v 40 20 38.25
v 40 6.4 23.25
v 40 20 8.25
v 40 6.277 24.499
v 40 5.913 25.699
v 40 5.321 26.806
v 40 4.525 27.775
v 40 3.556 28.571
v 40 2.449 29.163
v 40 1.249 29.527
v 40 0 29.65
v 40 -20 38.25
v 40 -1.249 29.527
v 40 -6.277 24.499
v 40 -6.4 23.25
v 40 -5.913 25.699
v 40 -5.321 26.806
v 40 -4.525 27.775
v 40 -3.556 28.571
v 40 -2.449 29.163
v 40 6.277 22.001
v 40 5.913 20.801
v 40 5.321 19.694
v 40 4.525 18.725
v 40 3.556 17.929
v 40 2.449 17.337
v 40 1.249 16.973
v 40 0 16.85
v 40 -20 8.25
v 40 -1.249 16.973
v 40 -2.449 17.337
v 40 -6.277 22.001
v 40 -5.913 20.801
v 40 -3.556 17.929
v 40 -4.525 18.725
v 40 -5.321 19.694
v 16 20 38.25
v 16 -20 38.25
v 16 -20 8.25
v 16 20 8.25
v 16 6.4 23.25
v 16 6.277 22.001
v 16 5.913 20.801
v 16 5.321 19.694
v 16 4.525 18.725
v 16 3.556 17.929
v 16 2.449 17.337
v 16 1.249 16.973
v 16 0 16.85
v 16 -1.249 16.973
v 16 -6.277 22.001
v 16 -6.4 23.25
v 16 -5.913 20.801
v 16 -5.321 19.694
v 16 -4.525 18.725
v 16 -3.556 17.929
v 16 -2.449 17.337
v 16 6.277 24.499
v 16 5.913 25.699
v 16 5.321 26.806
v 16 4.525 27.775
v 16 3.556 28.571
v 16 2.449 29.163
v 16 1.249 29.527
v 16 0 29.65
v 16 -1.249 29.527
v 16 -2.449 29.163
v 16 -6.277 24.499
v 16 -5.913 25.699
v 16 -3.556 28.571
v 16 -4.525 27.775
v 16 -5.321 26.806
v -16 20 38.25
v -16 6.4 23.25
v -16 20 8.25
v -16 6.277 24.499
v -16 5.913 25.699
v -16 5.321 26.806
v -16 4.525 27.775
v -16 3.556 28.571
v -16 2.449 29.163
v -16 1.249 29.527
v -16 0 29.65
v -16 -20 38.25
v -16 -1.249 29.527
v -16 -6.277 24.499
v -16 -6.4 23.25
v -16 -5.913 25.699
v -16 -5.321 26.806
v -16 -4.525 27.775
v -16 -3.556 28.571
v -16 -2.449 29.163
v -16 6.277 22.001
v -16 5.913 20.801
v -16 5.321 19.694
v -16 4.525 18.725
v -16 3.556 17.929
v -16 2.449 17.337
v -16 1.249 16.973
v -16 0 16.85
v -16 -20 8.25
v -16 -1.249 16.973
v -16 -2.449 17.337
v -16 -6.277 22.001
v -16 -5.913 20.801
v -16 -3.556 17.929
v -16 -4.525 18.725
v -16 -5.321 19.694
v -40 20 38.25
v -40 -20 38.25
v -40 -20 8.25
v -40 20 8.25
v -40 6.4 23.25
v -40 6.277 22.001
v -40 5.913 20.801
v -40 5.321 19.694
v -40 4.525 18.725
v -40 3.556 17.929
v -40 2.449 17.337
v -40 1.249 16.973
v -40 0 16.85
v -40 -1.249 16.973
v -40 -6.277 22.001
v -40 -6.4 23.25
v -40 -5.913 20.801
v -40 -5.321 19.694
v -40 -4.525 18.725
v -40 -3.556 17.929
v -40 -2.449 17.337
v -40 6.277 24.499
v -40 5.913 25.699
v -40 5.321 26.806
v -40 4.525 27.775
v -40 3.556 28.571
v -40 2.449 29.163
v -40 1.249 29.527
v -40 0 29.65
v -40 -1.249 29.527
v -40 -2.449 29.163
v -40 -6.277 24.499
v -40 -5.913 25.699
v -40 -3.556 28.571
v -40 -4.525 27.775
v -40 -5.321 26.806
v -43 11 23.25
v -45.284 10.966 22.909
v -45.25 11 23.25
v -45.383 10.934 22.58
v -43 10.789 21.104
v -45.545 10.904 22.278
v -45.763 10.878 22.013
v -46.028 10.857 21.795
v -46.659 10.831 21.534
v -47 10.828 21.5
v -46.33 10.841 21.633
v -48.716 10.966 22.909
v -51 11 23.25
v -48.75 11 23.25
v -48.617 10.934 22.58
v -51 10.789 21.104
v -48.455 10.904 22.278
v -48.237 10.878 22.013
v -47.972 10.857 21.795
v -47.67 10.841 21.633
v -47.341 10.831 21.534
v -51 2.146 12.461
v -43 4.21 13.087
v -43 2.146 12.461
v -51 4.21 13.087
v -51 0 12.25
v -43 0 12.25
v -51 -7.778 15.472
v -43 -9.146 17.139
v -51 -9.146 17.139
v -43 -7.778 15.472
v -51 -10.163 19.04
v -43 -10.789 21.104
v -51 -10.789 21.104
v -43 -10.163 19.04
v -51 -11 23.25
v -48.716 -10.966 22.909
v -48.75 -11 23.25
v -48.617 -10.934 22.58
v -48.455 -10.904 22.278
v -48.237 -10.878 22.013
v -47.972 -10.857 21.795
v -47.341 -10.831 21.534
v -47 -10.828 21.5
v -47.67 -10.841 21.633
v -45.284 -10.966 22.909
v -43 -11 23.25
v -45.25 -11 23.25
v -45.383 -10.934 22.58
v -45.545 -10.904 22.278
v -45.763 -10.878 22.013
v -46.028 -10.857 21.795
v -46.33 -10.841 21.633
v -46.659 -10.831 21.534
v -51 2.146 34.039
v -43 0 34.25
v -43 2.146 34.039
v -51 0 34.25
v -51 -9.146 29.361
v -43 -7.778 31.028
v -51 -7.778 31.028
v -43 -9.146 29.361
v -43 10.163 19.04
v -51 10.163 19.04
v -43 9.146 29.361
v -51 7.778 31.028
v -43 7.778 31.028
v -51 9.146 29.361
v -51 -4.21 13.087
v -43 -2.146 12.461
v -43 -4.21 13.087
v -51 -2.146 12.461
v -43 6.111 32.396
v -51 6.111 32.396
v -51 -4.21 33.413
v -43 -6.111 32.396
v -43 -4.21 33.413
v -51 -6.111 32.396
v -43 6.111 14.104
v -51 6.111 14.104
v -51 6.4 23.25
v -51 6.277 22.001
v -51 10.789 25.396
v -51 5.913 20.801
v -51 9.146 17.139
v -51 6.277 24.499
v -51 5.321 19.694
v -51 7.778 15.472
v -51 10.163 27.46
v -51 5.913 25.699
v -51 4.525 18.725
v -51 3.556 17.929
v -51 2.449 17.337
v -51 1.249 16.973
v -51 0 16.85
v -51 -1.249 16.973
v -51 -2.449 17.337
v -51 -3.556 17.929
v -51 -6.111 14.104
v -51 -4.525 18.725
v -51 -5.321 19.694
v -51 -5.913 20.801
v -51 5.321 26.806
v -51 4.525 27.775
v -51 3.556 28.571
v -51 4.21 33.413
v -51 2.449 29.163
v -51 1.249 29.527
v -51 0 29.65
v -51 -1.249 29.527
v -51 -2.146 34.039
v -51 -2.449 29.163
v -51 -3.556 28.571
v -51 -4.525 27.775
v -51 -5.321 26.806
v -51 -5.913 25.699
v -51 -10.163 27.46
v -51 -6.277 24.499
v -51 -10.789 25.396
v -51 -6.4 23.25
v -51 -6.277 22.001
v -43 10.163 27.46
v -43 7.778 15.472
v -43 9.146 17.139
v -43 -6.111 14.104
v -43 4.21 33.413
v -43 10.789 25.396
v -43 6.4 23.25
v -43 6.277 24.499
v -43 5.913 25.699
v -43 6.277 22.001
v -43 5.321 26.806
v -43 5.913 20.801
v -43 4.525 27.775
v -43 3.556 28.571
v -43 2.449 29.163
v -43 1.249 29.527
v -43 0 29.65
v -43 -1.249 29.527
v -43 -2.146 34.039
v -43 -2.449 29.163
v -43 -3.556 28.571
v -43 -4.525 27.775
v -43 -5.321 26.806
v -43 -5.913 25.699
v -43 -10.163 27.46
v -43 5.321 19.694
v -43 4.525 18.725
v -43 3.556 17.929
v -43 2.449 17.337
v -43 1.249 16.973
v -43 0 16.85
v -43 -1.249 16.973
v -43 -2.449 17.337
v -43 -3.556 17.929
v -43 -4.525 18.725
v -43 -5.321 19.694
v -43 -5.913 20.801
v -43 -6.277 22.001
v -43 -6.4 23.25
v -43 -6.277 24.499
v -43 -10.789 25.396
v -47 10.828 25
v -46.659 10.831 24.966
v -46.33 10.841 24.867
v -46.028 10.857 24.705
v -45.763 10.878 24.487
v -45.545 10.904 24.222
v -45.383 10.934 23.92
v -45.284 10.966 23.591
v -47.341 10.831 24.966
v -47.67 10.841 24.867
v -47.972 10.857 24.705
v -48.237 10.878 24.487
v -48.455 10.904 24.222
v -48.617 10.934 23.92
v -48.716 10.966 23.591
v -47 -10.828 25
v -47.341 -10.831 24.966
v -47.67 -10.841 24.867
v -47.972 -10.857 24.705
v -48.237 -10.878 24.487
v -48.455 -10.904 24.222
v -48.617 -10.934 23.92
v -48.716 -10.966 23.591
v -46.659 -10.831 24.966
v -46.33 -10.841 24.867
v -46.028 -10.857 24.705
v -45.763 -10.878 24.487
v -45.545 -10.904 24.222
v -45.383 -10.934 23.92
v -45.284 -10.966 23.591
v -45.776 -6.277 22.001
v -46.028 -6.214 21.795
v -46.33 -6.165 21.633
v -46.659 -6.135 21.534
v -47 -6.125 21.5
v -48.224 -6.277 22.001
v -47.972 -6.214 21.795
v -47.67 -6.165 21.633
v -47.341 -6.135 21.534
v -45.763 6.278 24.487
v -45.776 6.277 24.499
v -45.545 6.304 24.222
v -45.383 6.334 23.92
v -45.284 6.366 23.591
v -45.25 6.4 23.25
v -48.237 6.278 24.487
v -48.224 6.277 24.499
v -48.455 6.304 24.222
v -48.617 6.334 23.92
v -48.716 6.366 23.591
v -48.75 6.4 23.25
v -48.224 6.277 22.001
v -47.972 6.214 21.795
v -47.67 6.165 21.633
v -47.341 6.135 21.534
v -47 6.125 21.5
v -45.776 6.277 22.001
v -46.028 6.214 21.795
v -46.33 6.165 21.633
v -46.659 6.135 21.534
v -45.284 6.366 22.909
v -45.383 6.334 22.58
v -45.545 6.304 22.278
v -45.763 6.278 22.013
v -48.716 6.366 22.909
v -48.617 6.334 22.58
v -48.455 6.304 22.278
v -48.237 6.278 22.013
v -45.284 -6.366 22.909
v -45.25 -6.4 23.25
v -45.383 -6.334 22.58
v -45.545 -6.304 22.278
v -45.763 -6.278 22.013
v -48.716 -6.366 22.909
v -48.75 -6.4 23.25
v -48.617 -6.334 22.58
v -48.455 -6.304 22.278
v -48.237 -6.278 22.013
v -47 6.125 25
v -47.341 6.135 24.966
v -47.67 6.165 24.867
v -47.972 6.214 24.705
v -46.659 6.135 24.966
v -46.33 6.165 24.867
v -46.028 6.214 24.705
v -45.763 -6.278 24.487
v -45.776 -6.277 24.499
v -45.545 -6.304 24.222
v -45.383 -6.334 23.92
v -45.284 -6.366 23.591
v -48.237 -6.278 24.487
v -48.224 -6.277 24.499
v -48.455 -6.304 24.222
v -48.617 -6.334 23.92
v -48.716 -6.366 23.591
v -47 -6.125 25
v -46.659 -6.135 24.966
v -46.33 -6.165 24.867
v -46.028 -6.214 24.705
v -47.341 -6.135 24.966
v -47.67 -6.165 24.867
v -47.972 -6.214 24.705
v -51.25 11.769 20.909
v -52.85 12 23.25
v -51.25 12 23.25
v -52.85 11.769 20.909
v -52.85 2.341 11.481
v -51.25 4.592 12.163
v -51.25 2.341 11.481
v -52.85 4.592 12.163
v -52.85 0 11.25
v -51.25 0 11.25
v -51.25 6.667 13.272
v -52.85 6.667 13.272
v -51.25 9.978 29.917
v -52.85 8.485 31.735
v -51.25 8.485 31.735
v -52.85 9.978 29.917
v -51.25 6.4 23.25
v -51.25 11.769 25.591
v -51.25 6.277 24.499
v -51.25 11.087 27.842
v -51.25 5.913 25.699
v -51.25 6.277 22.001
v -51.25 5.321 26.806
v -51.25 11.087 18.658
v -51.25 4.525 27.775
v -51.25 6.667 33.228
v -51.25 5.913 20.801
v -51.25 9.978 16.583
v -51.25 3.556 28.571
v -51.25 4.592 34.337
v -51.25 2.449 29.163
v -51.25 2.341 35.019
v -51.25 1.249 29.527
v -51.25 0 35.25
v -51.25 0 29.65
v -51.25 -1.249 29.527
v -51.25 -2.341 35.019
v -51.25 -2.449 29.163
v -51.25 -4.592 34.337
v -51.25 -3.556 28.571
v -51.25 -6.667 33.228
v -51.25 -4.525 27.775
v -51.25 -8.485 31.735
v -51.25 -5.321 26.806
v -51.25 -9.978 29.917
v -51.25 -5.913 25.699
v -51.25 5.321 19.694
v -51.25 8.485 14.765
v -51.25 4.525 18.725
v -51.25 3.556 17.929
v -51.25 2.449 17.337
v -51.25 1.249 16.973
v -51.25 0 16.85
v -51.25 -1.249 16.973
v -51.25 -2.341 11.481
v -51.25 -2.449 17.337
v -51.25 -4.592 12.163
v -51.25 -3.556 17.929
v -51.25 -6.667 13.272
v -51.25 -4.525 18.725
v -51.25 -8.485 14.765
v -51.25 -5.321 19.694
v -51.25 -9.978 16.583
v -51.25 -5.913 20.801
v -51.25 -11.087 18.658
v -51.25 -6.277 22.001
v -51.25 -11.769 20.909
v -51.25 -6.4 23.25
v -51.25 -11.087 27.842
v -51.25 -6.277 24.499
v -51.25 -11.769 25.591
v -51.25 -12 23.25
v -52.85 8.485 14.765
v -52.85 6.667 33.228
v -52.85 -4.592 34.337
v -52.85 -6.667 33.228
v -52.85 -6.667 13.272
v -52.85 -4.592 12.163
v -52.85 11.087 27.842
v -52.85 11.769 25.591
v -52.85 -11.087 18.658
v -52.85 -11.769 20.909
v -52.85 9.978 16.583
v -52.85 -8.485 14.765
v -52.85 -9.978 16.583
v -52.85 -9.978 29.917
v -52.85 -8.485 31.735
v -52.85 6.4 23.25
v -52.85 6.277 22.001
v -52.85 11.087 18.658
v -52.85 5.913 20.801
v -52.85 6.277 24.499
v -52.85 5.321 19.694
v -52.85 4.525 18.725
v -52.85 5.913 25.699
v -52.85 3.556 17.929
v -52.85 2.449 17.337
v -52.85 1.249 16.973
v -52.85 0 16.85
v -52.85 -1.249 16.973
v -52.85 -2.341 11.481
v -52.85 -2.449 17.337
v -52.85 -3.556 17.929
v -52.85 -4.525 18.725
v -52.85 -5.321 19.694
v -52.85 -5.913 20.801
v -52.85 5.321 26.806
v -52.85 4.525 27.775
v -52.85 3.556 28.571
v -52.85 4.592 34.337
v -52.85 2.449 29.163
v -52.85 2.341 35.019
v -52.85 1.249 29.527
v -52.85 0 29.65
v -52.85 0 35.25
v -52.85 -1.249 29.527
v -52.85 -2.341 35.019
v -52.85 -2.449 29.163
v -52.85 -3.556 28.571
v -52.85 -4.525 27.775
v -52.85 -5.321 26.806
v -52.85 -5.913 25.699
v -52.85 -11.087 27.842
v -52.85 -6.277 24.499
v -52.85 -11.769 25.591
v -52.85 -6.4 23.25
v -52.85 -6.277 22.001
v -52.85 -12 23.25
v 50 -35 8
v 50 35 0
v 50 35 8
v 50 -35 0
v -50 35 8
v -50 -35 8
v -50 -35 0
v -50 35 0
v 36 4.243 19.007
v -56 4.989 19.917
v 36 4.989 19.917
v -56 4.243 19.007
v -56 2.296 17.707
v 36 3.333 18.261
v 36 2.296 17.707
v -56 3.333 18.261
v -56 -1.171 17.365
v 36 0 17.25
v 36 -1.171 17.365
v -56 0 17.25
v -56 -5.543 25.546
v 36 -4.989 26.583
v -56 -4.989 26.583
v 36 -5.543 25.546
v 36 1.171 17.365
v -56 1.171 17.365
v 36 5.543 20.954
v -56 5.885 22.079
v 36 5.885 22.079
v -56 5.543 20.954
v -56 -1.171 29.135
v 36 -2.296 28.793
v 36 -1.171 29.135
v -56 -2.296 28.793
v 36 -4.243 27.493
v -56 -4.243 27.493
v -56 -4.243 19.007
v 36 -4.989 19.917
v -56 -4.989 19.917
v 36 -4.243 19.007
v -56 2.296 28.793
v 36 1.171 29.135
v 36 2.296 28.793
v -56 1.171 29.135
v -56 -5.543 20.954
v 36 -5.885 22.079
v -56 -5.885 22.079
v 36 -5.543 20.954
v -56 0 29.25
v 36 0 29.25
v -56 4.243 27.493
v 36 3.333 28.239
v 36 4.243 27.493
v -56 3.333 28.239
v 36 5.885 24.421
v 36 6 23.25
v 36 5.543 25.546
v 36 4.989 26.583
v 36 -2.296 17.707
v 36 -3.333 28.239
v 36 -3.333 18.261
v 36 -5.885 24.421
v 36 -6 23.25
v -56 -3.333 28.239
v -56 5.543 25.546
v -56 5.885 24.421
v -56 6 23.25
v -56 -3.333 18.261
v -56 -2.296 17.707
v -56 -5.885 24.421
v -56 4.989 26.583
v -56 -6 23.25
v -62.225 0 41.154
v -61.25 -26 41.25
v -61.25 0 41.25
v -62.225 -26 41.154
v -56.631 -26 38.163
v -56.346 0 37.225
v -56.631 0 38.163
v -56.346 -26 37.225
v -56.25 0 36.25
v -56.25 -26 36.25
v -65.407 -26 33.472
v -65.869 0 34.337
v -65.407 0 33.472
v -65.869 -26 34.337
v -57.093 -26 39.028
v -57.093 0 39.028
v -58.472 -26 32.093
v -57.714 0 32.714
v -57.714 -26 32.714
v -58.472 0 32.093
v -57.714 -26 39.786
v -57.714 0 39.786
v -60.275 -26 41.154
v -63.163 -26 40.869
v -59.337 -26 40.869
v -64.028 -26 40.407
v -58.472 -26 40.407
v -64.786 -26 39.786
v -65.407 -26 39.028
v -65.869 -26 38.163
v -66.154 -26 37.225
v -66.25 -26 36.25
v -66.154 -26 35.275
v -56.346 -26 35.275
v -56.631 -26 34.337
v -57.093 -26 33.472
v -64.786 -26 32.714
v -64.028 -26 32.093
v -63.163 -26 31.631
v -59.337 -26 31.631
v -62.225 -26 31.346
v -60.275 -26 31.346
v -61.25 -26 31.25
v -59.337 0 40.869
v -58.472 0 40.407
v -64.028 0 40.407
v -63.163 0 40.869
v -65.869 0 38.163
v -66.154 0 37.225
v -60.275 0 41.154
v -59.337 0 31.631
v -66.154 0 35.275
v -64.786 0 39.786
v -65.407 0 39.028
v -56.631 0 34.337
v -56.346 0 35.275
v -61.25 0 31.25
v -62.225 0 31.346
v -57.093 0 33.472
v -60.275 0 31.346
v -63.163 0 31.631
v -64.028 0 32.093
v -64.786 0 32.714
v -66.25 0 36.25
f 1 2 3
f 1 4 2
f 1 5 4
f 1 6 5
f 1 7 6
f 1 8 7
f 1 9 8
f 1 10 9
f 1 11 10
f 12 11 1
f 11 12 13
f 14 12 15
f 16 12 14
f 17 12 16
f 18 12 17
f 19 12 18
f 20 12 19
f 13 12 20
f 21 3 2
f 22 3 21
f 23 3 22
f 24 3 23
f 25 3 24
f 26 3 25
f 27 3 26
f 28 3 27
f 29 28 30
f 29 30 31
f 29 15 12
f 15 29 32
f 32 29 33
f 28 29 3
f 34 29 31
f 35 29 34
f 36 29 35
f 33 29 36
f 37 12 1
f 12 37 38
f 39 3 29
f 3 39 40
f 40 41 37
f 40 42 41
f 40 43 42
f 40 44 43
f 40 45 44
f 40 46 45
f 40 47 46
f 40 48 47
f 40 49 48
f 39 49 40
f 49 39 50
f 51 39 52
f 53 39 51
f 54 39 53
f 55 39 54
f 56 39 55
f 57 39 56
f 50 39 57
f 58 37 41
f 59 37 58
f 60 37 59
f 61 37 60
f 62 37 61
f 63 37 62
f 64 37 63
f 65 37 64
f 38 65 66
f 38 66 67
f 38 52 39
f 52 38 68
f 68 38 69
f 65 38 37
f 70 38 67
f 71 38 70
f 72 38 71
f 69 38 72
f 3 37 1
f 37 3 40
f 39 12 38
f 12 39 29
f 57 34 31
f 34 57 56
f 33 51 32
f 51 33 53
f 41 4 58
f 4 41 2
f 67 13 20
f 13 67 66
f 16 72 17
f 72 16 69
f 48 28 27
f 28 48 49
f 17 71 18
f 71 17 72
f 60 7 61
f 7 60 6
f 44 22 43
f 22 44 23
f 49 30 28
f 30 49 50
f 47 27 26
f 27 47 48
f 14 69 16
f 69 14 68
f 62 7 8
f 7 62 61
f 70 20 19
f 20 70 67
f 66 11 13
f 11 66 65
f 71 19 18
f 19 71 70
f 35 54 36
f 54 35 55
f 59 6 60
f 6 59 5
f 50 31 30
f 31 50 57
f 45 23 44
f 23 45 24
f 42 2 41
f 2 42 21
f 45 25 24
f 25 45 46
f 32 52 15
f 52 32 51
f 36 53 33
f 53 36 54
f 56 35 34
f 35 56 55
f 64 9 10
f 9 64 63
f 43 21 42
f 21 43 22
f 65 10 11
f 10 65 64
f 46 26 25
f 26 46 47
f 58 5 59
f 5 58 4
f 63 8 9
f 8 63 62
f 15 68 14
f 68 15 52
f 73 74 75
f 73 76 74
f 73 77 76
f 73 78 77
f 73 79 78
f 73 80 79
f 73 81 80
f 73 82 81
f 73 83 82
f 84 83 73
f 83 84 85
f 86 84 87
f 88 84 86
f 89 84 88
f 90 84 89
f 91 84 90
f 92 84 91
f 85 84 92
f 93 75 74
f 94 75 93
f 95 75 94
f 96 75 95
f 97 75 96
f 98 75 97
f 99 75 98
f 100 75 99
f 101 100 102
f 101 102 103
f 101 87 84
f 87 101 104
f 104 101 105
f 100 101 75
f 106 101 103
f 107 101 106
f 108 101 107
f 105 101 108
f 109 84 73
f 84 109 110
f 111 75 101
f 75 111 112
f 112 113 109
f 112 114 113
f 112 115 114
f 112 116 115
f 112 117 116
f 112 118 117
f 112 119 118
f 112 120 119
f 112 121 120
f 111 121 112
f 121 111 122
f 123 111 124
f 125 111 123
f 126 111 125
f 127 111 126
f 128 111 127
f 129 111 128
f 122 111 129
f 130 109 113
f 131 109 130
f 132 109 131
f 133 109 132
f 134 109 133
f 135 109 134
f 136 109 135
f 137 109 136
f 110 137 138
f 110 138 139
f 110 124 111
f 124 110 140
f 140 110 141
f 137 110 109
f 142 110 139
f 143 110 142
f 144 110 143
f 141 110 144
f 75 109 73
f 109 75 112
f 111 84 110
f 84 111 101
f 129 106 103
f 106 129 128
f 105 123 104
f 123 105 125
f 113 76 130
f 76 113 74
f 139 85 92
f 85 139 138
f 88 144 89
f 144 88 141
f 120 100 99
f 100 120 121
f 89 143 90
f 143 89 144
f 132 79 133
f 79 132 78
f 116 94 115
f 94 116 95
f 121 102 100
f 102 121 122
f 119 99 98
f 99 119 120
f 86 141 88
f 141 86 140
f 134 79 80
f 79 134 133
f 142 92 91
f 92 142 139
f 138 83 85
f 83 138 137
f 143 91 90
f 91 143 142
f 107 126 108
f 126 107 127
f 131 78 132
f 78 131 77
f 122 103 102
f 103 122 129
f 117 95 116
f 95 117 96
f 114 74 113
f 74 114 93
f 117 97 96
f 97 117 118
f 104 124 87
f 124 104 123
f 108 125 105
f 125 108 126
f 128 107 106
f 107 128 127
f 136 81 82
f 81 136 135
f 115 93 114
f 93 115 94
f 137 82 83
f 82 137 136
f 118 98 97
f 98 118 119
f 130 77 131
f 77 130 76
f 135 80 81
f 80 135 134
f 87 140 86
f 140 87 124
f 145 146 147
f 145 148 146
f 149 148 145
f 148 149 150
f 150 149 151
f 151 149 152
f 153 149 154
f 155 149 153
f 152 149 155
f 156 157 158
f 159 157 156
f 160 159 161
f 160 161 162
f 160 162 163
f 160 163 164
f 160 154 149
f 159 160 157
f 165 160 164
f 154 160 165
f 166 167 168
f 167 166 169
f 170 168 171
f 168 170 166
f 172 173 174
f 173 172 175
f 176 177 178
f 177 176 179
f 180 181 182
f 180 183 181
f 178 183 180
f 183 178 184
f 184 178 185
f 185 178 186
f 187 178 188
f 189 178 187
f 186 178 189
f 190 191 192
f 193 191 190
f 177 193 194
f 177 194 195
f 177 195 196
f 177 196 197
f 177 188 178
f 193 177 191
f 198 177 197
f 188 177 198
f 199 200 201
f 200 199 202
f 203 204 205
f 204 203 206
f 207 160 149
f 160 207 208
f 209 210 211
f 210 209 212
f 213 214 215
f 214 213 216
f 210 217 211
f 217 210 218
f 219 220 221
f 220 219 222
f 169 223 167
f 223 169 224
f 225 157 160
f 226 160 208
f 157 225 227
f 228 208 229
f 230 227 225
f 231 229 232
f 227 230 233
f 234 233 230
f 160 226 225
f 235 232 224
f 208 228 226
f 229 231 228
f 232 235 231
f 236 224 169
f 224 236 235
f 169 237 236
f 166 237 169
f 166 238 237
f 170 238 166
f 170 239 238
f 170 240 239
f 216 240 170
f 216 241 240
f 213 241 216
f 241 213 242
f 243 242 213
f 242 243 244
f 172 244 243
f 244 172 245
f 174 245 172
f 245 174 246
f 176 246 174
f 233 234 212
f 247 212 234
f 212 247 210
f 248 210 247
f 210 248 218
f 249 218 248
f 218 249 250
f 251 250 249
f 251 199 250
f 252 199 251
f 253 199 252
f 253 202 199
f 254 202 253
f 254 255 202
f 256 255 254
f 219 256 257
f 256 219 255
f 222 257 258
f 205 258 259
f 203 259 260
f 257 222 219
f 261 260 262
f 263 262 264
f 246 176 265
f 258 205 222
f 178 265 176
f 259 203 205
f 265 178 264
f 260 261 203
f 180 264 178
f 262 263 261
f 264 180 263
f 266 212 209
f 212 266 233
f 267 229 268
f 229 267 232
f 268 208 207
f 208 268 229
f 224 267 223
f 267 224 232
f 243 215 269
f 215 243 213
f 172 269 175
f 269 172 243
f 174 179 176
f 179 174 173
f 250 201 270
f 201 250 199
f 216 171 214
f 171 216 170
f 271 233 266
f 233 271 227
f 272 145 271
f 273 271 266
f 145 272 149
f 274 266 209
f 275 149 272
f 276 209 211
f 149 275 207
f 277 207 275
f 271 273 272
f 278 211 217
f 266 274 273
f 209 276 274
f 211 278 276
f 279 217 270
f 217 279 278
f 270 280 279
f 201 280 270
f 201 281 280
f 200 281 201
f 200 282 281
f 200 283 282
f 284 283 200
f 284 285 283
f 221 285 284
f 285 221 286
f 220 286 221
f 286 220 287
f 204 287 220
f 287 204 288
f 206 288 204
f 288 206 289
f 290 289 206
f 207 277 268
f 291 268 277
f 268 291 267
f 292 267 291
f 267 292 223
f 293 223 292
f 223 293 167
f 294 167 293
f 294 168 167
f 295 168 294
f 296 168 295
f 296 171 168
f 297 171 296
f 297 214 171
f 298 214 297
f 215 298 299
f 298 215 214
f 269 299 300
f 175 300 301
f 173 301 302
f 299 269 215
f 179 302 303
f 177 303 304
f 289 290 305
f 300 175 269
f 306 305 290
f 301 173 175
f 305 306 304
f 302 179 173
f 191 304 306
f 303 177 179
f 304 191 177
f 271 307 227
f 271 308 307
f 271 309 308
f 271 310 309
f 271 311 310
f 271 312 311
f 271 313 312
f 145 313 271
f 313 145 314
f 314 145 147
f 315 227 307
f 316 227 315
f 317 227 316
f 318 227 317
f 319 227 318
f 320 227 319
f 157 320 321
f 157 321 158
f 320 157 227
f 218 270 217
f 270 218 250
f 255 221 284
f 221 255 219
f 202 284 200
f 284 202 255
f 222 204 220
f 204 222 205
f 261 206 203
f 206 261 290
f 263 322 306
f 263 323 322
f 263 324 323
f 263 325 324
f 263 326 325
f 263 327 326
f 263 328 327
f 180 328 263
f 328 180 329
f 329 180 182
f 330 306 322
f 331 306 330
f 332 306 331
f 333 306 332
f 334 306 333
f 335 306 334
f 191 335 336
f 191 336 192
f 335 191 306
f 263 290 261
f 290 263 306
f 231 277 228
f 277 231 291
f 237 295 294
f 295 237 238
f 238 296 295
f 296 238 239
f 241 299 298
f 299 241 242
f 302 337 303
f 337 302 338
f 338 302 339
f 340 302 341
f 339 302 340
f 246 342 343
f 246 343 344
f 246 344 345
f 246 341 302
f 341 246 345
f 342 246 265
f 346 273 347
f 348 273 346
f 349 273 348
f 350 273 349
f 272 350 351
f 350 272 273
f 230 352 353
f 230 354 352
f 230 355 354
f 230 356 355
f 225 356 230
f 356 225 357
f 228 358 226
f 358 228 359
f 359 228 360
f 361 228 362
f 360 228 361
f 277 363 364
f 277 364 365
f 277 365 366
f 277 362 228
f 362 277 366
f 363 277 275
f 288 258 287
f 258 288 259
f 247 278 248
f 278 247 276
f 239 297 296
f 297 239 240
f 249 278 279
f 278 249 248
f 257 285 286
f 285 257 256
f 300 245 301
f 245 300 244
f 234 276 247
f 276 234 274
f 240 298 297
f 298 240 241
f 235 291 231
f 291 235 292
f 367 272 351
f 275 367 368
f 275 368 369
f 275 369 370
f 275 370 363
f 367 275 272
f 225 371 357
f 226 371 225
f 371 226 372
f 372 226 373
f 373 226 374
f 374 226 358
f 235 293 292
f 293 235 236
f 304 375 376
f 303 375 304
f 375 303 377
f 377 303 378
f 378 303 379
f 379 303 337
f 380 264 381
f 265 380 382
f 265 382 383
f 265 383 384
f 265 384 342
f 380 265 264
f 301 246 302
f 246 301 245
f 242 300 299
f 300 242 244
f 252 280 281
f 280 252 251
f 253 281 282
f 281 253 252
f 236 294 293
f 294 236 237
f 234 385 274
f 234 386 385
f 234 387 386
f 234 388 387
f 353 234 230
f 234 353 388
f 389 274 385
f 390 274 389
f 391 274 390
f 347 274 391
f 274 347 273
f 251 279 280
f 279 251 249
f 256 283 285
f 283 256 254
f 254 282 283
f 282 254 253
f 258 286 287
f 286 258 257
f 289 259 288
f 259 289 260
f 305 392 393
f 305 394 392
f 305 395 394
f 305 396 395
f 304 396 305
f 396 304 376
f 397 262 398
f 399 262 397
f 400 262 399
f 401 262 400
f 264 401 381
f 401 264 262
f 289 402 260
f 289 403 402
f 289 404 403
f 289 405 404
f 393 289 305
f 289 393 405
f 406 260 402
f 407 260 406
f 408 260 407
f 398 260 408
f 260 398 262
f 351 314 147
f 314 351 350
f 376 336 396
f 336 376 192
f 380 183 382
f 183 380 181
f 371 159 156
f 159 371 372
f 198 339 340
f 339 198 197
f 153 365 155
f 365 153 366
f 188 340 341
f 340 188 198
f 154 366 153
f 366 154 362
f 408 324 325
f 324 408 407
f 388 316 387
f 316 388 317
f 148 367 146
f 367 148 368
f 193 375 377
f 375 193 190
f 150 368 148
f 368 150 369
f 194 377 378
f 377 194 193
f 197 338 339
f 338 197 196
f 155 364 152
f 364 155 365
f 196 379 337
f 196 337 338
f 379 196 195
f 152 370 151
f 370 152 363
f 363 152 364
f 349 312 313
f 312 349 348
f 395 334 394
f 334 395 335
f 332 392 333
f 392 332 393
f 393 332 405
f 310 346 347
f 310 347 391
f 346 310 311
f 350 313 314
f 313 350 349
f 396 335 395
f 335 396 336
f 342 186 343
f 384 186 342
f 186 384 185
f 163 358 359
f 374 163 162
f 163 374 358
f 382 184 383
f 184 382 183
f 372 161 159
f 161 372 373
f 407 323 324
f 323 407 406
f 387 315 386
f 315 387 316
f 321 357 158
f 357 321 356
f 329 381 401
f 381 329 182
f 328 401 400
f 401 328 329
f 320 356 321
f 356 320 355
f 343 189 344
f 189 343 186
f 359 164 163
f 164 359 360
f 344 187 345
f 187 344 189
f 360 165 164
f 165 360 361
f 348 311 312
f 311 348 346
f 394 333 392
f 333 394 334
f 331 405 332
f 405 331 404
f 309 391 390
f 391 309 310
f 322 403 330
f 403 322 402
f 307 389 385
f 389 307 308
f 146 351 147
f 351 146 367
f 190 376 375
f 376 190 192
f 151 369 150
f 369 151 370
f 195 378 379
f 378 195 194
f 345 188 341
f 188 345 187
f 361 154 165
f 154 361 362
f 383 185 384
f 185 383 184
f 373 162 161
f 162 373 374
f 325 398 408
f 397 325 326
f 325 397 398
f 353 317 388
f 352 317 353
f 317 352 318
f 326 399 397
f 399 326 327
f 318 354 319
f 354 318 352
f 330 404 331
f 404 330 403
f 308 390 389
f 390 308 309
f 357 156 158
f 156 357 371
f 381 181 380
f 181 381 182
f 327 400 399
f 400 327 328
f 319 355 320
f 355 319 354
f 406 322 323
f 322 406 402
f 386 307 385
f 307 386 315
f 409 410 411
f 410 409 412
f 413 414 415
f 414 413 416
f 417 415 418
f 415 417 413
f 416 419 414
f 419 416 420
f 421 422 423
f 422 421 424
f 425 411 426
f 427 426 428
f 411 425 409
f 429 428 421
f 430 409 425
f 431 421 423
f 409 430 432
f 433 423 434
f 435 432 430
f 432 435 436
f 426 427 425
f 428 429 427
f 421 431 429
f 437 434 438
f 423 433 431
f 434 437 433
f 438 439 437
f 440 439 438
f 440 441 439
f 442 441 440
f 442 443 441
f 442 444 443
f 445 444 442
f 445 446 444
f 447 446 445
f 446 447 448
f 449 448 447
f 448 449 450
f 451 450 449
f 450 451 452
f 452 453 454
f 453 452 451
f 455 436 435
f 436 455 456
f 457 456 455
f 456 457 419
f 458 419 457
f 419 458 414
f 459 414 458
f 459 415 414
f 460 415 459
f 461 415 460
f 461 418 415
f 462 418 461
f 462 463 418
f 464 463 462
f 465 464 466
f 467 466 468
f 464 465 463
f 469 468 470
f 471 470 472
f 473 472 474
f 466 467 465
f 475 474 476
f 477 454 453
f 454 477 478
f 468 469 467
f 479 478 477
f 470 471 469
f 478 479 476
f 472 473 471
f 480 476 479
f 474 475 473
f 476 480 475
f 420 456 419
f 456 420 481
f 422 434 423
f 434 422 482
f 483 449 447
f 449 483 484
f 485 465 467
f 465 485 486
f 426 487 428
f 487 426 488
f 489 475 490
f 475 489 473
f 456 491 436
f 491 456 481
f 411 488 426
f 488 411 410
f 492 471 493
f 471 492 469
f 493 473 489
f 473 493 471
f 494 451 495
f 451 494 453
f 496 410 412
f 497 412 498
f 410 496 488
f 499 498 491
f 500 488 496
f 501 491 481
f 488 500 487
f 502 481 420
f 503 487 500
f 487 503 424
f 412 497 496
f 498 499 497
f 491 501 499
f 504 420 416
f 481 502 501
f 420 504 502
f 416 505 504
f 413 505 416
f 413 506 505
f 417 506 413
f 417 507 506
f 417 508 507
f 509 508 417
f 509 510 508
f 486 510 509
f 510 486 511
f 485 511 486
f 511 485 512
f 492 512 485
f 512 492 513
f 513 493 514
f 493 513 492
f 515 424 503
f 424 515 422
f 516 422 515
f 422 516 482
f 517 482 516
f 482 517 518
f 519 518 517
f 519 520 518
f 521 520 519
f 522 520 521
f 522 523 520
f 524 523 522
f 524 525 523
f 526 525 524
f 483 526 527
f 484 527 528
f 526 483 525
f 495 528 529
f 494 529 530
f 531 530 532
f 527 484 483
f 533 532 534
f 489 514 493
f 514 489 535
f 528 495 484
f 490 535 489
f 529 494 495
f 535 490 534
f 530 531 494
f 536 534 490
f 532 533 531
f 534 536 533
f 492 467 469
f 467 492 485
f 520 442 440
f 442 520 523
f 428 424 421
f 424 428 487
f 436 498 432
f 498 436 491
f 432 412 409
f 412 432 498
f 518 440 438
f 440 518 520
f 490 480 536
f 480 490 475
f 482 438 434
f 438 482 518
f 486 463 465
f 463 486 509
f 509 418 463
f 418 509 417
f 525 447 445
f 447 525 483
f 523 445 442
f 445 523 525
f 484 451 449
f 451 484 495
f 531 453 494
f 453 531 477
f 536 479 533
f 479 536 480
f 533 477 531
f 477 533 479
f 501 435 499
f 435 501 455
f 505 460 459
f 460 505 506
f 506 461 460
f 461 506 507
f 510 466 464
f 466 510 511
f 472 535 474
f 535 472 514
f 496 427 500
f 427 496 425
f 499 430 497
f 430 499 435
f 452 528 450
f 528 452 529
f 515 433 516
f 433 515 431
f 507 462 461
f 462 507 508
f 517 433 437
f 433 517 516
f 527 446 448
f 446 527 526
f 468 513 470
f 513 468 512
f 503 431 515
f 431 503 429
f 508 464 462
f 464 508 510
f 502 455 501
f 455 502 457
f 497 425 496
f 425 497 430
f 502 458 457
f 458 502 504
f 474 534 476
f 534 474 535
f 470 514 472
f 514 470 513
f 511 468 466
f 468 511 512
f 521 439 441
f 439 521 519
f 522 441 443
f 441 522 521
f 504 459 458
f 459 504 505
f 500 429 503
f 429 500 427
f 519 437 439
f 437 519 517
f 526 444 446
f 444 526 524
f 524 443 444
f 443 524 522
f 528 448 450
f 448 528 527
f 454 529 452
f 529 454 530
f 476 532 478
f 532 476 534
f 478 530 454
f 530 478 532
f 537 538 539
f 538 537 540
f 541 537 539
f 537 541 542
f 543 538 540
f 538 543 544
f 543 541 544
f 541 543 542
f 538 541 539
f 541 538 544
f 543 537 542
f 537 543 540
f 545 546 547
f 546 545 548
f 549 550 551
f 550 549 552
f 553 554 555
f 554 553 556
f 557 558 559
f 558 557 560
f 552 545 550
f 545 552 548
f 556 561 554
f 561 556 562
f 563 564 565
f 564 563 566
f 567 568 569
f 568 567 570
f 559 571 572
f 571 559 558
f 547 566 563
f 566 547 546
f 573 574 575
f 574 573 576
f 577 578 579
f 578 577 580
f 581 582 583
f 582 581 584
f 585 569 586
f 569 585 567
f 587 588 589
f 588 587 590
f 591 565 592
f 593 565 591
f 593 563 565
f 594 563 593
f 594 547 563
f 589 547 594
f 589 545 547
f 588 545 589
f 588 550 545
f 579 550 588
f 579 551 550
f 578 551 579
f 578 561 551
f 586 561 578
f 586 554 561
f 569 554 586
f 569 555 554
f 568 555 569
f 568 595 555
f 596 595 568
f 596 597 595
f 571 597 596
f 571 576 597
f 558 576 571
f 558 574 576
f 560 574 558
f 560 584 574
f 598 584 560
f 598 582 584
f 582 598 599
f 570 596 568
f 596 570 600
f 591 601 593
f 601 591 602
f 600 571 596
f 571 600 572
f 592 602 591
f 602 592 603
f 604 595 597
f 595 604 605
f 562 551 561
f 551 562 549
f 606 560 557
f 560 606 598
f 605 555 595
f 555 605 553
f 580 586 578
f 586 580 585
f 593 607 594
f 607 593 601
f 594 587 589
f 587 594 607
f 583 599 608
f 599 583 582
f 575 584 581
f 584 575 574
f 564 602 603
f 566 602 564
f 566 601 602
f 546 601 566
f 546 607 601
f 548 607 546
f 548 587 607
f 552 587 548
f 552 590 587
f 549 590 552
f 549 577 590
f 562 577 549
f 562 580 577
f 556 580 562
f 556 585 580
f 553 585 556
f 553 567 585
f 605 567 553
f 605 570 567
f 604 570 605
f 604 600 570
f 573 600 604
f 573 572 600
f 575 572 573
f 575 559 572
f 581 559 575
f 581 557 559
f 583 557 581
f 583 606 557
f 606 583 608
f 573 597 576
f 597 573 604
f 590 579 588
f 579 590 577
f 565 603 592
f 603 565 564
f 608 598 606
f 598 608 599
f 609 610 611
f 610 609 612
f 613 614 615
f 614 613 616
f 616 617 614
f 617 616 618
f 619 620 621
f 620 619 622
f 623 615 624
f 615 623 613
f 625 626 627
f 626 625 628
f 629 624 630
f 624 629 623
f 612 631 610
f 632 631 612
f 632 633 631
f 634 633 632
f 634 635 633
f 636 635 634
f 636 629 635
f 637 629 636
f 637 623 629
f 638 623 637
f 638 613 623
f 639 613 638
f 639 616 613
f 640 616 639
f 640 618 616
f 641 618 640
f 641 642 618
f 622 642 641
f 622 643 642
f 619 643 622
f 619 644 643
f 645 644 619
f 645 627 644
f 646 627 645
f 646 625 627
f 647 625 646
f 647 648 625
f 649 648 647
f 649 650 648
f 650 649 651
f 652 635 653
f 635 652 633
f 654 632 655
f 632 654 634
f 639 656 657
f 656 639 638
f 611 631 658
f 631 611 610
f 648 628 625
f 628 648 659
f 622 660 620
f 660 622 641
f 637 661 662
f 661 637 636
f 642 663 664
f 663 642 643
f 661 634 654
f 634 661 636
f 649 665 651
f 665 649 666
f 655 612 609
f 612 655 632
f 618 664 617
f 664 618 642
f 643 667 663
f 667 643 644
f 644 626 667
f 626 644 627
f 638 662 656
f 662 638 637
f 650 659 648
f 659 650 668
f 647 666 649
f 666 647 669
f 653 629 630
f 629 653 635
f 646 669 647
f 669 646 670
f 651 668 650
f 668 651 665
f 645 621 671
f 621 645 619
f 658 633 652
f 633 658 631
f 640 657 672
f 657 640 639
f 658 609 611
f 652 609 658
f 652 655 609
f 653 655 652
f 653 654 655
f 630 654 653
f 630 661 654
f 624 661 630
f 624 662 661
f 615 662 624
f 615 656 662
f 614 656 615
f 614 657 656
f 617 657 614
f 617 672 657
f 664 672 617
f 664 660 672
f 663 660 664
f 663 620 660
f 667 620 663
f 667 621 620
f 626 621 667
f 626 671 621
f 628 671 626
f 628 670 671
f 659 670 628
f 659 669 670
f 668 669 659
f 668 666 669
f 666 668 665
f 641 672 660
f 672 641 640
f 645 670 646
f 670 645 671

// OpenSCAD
$fn = 32;

// ------------------------------------------------------------------------
// Machine vise: screw d12, jaws 24 x 30 mm
// Every part is its own module, assembly() places every instance.
// ------------------------------------------------------------------------

// --- part 1 ---
module vise_bed() {
  difference() {
    translate([-50, -35, 0]) cube([100, 70, 8]);
  }
}

// --- part 2 ---
module vise_jaw() {
  difference() {
    translate([-12, -20, 0]) cube([24, 40, 30]);
    translate([0, 0, 15]) rotate([0, 90, 0]) cylinder(h = 26, d = 12.8, center = true);
  }
}

// --- part 3 ---
module vise_screw() {
  translate([0, 0, -46]) cylinder(h = 92, d = 12);
}

// --- part 4 ---
module screw_collar() {
  difference() {
    cylinder(h = 8, d = 22);
    translate([0, 0, -1]) cylinder(h = 10, d = 12.8);
    translate([0, 0, 4]) rotate([90, 0, 0]) cylinder(h = 24, d = 3.5, center = true);
  }
}

// --- part 5 ---
module screw_washer() {
  difference() {
      translate([0, 0, 0]) cylinder(h = 1.6, d = 24);
      translate([0, 0, -1]) cylinder(h = 3.6, d = 12.8);
    }
}

// --- part 6 ---
module vise_handle() {
  cylinder(h = 26, d = 10);
}

// --- assembly ---
module assembly() {
  color([0.80, 0.24, 0.20]) translate([0, 0, 0]) rotate([0, 0, 0]) vise_bed();
  color([0.20, 0.45, 0.75]) translate([28, 0, 8.25]) rotate([0, 0, 0]) vise_jaw();
  color([0.25, 0.62, 0.32]) translate([-28, 0, 8.25]) rotate([0, 0, 0]) vise_jaw();
  color([0.92, 0.70, 0.18]) translate([-10, 0, 23.25]) rotate([0, 90, 0]) vise_screw();
  color([0.58, 0.35, 0.70]) translate([-51, 0, 23.25]) rotate([0, 90, 0]) screw_collar();
  color([0.16, 0.66, 0.66]) translate([-52.85, 0, 23.25]) rotate([0, 90, 0]) screw_washer();
  color([0.85, 0.48, 0.18]) translate([-61.25, 0, 36.25]) rotate([90, 0, 0]) vise_handle();
}

assembly();
